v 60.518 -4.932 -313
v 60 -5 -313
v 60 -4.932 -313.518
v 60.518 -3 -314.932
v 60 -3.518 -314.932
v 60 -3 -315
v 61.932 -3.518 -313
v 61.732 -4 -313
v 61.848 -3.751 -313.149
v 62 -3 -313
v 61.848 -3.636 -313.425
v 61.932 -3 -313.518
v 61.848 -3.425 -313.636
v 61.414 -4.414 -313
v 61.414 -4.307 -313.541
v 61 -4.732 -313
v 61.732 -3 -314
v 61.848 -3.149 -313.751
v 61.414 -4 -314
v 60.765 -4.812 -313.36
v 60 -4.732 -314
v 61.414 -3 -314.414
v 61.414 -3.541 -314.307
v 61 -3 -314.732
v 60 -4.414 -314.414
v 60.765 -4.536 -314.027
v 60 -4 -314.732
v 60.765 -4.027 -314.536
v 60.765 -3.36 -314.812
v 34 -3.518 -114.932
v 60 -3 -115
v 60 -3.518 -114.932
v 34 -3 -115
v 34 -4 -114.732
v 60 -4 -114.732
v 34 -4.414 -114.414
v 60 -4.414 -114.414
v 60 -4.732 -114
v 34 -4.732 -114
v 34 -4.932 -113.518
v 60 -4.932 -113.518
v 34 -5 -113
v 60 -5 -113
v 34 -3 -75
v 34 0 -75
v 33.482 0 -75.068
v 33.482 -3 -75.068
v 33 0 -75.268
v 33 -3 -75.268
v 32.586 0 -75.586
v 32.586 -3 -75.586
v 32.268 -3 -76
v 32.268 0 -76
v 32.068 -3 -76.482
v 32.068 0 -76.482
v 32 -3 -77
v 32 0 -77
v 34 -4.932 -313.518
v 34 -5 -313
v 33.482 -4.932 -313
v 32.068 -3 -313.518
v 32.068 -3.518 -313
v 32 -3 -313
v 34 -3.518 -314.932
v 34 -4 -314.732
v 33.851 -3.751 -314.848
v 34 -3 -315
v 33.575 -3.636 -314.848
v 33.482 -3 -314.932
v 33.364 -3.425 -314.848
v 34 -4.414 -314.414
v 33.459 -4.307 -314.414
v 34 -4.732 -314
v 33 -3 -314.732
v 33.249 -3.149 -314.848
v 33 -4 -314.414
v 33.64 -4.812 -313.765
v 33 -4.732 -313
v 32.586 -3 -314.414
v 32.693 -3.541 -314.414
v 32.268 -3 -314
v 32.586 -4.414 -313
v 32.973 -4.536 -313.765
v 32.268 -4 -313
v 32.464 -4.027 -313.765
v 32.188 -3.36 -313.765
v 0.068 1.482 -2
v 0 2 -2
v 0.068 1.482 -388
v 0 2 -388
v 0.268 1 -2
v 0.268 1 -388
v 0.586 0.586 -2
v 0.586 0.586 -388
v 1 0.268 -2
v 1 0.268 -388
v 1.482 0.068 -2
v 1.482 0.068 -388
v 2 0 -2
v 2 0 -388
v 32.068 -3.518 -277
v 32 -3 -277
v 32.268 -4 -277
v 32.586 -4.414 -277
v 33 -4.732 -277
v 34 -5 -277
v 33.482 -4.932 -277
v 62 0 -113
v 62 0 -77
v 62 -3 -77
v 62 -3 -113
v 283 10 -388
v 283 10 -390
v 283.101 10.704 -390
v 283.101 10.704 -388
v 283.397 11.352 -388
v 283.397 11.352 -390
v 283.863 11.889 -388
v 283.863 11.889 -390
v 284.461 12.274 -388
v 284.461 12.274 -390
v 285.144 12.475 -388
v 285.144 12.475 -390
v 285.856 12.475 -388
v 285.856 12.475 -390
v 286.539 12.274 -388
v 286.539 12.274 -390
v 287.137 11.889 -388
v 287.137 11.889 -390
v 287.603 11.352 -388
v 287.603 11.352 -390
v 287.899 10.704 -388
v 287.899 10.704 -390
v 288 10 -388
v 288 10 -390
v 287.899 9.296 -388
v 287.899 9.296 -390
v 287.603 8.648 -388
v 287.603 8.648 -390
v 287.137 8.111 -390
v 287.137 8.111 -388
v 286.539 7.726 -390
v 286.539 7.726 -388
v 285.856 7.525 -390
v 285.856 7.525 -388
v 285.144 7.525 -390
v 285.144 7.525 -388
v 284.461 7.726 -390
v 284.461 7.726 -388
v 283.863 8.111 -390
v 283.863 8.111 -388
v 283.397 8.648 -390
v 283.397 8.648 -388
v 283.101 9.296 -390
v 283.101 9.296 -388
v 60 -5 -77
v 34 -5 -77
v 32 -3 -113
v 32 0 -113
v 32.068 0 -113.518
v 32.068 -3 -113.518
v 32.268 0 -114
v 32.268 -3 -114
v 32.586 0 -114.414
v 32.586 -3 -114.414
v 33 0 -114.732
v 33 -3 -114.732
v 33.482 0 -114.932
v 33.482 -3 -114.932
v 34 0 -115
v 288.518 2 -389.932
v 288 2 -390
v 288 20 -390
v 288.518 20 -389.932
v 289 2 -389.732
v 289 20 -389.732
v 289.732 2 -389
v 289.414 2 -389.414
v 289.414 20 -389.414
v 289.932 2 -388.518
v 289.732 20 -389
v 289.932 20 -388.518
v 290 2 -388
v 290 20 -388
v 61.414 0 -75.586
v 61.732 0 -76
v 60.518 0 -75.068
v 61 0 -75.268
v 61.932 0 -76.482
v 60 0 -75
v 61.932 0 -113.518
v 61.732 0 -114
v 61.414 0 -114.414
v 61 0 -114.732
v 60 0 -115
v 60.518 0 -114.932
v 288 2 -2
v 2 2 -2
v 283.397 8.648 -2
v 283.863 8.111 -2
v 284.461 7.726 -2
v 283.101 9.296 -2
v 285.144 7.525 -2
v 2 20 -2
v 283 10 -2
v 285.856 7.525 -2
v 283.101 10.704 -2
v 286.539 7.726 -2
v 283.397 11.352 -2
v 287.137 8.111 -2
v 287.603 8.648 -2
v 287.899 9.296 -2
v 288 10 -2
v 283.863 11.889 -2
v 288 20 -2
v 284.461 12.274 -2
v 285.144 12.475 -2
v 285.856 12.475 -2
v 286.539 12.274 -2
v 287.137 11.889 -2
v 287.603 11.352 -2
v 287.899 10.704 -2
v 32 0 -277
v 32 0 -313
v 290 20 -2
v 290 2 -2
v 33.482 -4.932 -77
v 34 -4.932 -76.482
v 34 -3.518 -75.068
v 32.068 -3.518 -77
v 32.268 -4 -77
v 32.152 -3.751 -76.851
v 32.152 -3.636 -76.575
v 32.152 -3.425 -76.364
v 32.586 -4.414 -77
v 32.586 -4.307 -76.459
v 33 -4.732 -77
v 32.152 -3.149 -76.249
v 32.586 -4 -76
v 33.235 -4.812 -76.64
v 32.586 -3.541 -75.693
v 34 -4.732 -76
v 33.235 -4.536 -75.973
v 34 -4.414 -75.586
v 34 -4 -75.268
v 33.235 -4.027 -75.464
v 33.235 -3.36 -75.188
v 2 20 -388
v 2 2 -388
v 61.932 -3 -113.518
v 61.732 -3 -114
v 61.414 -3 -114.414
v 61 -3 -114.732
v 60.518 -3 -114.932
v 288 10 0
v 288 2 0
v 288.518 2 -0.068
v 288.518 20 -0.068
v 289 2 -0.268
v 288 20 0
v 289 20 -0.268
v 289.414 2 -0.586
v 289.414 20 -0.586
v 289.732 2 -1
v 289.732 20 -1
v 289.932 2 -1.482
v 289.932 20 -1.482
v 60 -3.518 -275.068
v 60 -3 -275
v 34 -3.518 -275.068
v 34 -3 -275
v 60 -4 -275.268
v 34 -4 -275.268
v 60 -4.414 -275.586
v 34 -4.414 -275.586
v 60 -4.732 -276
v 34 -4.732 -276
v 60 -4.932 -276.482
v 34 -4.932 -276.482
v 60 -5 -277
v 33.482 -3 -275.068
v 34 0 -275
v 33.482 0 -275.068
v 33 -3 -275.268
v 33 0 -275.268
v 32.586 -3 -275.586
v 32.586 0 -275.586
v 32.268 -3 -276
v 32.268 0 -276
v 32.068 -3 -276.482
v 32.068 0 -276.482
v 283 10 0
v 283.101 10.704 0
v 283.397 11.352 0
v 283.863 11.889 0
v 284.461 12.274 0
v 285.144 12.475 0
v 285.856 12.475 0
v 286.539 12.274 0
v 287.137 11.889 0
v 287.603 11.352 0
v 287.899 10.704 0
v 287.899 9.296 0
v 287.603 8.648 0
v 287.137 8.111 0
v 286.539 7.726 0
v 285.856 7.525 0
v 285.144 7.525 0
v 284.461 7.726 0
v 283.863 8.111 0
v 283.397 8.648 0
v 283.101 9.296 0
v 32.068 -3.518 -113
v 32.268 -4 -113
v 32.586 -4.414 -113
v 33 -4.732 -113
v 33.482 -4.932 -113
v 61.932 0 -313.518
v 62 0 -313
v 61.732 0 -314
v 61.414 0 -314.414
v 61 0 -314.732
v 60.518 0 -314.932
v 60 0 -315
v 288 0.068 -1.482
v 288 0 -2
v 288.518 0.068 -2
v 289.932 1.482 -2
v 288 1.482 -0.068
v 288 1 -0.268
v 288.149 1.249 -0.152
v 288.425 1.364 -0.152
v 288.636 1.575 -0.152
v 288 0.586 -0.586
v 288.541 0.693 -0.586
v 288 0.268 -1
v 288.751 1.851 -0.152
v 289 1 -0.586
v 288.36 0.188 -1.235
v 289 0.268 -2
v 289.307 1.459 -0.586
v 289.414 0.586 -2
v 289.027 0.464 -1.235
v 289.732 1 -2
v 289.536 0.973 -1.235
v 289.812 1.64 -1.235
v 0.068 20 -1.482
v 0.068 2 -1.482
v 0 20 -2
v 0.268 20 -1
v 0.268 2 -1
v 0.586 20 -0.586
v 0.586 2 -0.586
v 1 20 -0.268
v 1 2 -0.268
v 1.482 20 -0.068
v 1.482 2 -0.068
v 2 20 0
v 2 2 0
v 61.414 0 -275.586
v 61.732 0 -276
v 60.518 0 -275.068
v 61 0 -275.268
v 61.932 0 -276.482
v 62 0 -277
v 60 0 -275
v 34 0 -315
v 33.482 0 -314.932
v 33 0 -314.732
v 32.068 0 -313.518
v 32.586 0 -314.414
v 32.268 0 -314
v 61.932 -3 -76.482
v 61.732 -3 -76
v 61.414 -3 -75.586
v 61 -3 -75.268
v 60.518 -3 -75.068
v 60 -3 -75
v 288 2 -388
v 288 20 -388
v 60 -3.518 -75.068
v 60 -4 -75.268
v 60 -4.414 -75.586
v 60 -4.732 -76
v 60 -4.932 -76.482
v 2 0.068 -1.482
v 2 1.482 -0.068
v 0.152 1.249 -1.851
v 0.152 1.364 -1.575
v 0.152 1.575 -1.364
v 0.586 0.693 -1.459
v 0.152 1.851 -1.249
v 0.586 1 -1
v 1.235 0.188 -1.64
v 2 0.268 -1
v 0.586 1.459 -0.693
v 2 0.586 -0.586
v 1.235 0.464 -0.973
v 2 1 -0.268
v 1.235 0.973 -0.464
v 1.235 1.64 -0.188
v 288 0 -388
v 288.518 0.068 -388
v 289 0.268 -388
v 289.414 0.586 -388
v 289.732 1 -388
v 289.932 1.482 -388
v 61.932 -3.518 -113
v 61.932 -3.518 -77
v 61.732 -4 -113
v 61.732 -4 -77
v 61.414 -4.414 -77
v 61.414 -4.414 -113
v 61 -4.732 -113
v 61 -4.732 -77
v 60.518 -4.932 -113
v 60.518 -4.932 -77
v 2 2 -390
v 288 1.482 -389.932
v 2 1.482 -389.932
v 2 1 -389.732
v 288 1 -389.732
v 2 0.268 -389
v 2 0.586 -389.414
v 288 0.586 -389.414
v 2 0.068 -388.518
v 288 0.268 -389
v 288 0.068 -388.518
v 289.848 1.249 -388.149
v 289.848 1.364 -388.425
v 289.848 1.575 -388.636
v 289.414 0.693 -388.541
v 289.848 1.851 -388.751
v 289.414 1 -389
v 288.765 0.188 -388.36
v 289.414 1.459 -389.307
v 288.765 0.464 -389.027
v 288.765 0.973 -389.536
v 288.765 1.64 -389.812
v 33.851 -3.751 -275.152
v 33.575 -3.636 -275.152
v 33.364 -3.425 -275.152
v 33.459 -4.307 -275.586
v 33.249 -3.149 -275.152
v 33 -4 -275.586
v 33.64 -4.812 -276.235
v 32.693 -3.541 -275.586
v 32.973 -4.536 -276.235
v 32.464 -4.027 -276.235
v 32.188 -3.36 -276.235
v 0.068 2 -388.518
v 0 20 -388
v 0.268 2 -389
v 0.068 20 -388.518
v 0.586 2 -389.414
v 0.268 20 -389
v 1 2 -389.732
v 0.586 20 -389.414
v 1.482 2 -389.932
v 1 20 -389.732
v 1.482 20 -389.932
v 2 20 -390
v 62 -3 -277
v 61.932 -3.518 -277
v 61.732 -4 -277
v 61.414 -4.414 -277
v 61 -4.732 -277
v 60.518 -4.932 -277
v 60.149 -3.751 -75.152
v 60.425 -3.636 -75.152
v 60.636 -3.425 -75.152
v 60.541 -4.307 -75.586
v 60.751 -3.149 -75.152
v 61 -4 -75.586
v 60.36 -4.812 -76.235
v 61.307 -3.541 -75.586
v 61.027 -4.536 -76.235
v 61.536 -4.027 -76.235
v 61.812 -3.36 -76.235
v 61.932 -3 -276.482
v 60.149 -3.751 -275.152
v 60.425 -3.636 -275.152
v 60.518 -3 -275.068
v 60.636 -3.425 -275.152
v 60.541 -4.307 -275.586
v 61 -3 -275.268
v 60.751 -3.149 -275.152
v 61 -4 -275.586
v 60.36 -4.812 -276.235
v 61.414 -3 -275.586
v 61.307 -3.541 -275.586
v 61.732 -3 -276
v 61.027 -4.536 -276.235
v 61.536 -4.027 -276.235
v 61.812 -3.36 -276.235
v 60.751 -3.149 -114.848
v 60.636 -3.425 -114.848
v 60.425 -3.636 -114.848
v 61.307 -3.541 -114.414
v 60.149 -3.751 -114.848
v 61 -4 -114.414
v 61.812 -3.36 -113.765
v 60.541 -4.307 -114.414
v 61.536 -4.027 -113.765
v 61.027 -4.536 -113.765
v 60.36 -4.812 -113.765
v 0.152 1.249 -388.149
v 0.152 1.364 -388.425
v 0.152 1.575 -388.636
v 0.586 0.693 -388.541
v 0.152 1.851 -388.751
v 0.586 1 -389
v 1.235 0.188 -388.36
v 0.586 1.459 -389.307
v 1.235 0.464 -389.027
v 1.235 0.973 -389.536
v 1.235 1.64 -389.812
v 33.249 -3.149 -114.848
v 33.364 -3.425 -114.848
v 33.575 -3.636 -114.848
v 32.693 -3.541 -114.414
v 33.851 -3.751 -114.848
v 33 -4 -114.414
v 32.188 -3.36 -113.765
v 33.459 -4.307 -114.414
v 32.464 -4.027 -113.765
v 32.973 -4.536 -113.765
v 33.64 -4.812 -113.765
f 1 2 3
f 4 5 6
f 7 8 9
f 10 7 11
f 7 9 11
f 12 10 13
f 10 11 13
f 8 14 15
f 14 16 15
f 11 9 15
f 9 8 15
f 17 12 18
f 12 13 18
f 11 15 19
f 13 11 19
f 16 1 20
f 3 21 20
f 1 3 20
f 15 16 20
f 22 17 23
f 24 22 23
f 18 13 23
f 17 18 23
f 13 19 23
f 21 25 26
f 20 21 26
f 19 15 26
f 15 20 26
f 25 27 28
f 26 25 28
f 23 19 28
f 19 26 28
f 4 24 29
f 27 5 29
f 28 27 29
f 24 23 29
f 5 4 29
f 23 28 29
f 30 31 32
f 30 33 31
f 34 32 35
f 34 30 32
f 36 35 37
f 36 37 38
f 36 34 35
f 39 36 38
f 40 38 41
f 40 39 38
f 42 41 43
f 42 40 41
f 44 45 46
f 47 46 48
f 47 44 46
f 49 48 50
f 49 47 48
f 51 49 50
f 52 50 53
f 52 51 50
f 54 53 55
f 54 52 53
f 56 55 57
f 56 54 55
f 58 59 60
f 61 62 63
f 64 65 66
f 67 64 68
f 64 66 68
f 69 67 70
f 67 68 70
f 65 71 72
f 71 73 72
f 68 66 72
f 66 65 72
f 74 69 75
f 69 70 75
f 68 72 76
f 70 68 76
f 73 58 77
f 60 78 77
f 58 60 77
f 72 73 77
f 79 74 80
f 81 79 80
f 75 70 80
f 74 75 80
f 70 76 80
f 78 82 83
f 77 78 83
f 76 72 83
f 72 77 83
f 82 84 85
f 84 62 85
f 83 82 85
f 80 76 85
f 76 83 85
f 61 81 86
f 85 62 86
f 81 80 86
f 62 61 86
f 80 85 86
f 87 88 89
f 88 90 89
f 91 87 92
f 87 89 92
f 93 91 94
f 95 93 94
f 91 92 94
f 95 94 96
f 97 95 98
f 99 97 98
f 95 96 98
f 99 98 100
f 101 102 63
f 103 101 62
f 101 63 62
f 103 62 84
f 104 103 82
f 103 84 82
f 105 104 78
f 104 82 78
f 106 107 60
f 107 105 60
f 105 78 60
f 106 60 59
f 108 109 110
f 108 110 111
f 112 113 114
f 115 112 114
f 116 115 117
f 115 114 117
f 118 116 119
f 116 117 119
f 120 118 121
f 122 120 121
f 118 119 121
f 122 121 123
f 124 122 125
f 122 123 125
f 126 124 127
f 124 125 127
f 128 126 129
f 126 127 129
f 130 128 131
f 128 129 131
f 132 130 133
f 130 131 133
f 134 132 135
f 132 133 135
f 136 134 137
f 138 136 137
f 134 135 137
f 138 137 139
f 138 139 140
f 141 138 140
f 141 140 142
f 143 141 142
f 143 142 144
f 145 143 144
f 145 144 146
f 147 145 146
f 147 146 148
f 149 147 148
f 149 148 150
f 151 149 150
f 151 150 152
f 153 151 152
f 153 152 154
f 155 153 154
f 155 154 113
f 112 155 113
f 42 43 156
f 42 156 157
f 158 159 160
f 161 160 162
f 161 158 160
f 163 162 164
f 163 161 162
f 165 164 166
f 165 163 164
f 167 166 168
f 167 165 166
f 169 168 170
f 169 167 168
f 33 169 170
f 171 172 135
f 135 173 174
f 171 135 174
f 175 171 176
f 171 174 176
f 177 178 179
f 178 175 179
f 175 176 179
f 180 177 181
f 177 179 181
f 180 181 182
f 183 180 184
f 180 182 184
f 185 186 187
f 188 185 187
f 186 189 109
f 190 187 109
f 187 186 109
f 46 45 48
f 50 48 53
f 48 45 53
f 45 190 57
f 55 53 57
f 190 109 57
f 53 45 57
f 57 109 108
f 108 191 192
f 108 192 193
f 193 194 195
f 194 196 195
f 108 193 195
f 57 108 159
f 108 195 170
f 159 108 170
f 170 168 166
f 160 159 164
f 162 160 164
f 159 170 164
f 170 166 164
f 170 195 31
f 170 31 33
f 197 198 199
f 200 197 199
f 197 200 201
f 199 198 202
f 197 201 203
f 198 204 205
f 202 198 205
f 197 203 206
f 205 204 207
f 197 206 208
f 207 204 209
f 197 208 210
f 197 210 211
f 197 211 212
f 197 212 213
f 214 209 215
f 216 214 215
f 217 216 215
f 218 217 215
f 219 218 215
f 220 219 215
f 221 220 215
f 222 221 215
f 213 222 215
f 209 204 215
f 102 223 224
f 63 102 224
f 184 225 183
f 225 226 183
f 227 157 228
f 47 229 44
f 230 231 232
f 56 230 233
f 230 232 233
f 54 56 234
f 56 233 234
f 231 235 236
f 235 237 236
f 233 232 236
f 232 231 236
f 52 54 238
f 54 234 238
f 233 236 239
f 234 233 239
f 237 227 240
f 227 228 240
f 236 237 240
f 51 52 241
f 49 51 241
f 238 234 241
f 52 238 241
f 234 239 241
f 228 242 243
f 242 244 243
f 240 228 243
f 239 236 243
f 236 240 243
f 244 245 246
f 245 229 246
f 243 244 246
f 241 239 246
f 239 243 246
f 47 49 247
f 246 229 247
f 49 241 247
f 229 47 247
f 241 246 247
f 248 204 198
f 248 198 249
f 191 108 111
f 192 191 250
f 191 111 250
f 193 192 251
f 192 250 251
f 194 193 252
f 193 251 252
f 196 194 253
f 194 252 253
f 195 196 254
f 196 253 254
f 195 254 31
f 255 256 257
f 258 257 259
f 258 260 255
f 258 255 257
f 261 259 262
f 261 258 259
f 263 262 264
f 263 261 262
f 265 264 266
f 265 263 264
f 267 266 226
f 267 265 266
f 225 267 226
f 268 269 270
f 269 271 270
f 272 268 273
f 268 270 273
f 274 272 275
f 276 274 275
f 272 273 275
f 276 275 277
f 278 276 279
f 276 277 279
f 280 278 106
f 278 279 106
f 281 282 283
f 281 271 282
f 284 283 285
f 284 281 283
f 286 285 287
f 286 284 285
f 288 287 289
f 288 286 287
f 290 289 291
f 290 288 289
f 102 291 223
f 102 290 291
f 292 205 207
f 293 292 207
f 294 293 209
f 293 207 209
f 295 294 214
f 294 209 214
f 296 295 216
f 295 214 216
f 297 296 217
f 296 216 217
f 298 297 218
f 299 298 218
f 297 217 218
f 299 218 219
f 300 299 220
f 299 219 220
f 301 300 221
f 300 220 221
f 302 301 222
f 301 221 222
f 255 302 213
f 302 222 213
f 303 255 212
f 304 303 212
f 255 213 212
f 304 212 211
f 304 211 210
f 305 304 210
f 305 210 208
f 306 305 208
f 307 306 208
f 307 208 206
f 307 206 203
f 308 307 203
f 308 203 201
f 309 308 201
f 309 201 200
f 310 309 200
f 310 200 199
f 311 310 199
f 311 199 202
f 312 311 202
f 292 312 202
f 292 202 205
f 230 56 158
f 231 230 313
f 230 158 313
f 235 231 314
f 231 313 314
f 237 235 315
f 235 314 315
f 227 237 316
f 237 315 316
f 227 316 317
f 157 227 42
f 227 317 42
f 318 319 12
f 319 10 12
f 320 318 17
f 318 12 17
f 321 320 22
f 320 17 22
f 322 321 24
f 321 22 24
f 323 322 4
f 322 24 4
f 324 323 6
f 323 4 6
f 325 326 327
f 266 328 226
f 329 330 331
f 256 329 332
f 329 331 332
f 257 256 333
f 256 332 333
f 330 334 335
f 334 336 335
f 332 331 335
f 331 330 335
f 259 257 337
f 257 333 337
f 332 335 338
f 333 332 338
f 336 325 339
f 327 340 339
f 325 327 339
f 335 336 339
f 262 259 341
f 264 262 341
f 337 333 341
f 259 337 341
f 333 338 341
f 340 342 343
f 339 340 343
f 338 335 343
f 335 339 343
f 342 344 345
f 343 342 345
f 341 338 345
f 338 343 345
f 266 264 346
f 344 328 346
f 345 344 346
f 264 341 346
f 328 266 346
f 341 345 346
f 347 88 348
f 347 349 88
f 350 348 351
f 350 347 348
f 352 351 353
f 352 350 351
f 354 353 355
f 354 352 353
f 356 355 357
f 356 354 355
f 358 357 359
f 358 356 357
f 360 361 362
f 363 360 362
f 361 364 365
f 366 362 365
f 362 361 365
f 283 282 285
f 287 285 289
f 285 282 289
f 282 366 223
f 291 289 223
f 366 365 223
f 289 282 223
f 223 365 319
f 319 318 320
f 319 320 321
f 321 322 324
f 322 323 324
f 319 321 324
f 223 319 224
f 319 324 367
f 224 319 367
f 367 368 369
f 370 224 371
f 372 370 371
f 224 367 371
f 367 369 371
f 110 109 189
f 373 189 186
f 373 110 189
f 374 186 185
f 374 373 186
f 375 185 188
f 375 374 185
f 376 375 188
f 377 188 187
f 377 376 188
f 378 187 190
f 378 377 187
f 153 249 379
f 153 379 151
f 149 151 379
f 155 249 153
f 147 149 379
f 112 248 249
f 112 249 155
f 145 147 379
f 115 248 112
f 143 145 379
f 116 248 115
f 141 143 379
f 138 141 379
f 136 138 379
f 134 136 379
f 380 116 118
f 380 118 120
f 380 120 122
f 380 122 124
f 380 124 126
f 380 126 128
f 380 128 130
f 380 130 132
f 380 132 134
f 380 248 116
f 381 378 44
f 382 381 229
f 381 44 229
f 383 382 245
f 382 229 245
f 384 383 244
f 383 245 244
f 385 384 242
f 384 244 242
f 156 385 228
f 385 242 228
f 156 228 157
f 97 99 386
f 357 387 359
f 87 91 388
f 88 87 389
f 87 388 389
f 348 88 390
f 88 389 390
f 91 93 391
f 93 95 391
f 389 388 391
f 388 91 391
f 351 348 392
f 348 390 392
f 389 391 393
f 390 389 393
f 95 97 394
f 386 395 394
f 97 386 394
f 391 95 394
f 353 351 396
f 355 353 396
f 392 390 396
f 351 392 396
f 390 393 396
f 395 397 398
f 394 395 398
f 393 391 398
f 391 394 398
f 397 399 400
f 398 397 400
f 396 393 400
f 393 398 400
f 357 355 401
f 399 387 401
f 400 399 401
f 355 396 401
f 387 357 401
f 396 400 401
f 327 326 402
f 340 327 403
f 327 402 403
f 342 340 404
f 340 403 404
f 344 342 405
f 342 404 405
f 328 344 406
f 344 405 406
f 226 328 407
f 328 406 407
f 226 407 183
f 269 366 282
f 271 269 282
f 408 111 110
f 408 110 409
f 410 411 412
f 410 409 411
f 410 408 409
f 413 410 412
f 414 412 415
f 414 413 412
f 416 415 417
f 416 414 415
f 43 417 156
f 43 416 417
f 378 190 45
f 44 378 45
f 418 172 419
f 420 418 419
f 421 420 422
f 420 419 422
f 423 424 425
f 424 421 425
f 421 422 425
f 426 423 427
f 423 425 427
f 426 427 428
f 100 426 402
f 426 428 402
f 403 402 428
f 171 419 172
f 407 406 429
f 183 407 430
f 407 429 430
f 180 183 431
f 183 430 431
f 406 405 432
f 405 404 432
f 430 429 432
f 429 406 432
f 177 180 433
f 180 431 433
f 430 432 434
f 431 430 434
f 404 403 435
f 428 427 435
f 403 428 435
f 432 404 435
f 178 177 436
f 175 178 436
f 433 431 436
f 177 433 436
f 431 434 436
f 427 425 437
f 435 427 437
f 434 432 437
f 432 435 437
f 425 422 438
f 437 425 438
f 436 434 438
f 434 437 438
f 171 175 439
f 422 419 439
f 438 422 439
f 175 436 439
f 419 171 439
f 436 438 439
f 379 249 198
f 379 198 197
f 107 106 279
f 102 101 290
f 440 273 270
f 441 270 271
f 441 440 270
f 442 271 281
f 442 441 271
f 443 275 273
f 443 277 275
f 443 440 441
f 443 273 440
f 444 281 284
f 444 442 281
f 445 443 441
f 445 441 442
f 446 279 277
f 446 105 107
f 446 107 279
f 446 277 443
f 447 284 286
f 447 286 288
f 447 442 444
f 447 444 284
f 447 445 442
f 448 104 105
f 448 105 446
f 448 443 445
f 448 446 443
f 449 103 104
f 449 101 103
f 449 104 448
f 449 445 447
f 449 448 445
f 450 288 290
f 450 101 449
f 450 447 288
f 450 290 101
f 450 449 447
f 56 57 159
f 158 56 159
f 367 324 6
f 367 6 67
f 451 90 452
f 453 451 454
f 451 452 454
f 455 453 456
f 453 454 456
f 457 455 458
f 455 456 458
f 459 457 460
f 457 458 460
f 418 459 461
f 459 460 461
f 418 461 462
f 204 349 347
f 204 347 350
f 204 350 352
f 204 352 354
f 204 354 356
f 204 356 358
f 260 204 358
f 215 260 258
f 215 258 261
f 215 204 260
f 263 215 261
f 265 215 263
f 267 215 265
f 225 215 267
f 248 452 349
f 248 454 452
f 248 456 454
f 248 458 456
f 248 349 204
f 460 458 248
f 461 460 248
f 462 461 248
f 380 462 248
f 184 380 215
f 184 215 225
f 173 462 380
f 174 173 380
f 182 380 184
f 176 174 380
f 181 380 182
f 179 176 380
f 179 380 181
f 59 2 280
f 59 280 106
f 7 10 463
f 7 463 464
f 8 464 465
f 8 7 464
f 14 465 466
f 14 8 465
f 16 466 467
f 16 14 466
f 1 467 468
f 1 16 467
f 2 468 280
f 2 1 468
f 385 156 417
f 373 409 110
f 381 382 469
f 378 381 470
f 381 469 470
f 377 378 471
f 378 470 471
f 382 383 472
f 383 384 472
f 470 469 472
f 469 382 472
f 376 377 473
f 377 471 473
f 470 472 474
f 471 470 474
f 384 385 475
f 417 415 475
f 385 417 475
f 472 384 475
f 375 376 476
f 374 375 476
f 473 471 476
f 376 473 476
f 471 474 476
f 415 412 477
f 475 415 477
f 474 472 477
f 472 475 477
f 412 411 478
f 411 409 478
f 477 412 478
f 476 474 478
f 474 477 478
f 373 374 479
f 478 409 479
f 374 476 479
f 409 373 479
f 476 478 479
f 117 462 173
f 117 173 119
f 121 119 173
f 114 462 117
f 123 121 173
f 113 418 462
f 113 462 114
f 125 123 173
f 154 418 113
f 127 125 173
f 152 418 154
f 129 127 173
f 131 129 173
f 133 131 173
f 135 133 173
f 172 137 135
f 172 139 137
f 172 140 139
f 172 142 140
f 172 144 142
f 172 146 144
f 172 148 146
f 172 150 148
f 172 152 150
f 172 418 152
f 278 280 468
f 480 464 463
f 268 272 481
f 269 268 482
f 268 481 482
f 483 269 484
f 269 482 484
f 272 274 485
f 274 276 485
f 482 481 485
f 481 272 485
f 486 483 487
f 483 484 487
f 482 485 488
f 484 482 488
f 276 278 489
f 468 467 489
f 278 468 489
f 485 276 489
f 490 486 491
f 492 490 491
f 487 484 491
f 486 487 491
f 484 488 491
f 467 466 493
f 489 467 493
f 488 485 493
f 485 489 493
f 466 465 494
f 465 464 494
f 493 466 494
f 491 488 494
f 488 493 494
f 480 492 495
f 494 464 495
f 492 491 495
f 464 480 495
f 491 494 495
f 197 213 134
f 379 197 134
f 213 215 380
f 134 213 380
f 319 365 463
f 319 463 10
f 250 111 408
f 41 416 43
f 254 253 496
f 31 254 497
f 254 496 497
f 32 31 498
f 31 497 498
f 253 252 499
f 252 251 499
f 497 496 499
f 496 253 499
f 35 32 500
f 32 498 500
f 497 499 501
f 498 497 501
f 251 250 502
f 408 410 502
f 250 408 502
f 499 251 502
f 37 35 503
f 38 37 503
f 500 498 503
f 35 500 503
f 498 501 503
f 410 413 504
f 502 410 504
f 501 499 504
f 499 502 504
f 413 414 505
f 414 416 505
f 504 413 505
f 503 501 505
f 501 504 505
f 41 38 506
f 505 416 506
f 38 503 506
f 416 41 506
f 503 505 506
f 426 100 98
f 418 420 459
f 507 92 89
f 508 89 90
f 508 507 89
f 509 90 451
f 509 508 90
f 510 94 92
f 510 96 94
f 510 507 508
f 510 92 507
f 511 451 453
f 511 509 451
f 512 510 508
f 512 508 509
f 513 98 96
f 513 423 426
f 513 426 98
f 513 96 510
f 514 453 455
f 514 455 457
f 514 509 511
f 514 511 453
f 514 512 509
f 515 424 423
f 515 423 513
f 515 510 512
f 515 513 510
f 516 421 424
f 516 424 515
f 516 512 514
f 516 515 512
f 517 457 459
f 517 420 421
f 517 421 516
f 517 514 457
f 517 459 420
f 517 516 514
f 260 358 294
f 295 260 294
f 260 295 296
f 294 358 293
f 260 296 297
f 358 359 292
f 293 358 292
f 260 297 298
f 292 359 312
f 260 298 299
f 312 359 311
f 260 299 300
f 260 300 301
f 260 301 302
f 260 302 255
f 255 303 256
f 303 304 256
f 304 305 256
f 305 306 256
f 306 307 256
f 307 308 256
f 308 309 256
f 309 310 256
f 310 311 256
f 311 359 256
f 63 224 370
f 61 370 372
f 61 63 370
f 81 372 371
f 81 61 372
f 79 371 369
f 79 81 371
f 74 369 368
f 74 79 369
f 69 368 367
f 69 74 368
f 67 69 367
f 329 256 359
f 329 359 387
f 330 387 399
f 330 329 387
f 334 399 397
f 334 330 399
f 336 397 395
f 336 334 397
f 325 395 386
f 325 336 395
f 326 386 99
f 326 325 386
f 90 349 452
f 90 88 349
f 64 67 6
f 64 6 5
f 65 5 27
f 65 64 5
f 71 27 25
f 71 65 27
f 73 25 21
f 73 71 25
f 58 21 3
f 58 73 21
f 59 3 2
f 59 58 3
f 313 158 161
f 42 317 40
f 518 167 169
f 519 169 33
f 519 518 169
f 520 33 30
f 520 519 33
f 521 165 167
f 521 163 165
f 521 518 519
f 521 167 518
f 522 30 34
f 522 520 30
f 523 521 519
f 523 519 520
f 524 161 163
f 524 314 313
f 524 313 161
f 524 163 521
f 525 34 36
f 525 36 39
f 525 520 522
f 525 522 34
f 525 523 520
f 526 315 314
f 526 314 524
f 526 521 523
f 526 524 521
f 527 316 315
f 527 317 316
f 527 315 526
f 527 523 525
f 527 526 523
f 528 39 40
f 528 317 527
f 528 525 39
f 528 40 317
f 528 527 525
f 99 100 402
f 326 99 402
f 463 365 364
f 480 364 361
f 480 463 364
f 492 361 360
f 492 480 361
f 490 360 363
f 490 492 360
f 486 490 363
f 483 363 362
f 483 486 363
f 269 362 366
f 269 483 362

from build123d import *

# Parameters (mm, degrees)
SKETCH1_W             = 290
SKETCH1_H             = 390
BOSS_EXTRUDE1_DEPTH   = 20
SKETCH2_W             = 286
SKETCH2_H             = 386
CUT_EXTRUDE1_DEPTH    = 18
FILLET1_R             = 2
SKETCH3_R             = 2.5
CUT_EXTRUDE2_DEPTH    = 391
SKETCH4_W             = 30
SKETCH4_H             = 40
BOSS_EXTRUDE2_DEPTH   = 5
BOSS_EXTRUDE2_2_DEPTH = 5
FILLET2_R             = 2
FILLET3_R             = 2


with BuildPart() as part:
    # Sketch1 → Boss-Extrude1 (new body)
    with BuildSketch(Plane(origin=(0, 0, 0), x_dir=(1, 0, 0), z_dir=(0, 1, 0))):
        with Locations((145, 195)):
            Rectangle(SKETCH1_W, SKETCH1_H)
    extrude(amount=BOSS_EXTRUDE1_DEPTH)

    # Sketch2 → Cut-Extrude1 (cut)
    with BuildSketch(Plane(origin=(0, 20, 0), x_dir=(1, 0, 0), z_dir=(0, 1, 0))):
        with Locations((145, 195)):
            Rectangle(SKETCH2_W, SKETCH2_H)
    extrude(amount=-CUT_EXTRUDE1_DEPTH, mode=Mode.SUBTRACT)

    # Fillet1
    fillet1_edges = [part.edges().sort_by_distance(p)[0] for p in [
        (145, 0, -390),
        (290, 0, -195),
        (145, 0, 0),
        (0, 0, -195),
        (0, 10, -390),
        (290, 10, -390),
        (290, 10, 0),
        (0, 10, 0),
    ]]
    fillet(fillet1_edges, radius=FILLET1_R)

    # Sketch3 → Cut-Extrude2 (cut, through all)
    with BuildSketch(Plane(origin=(0, 0, -390), x_dir=(-1, 0, 0), z_dir=(0, 0, -1))):
        with Locations((-285.5, 10)):
            Circle(SKETCH3_R)
    extrude(amount=-CUT_EXTRUDE2_DEPTH, mode=Mode.SUBTRACT)


with BuildPart() as body_2:
    # Sketch4 → Boss-Extrude2 (new body)
    with BuildSketch(Plane(origin=(0, 0, 0), x_dir=(-1, 0, 0), z_dir=(0, -1, 0))):
        with Locations((-47, 95)):
            Rectangle(SKETCH4_W, SKETCH4_H)
    extrude(amount=BOSS_EXTRUDE2_DEPTH)

    # Fillet2
    fillet2_edges = [body_2.edges().sort_by_distance(p)[0] for p in [
        (62, -5, -95),
        (47, -5, -75),
        (32, -5, -95),
        (32, -2.5, -75),
        (62, -2.5, -75),
        (62, -2.5, -115),
        (32, -2.5, -115),
        (47, -5, -115),
    ]]
    fillet(fillet2_edges, radius=FILLET2_R)


with BuildPart() as body_3:
    # Sketch4 → Boss-Extrude2 2 (new body)
    with BuildSketch(Plane(origin=(0, 0, 0), x_dir=(-1, 0, 0), z_dir=(0, -1, 0))):
        with Locations((-47, 295)):
            Rectangle(SKETCH4_W, SKETCH4_H)
    extrude(amount=BOSS_EXTRUDE2_2_DEPTH)

    # Fillet3
    fillet3_edges = [body_3.edges().sort_by_distance(p)[0] for p in [
        (32, -5, -295),
        (47, -5, -315),
        (62, -5, -295),
        (47, -5, -275),
        (32, -2.5, -275),
        (62, -2.5, -275),
        (62, -2.5, -315),
        (32, -2.5, -315),
    ]]
    fillet(fillet3_edges, radius=FILLET3_R)


solid = Compound([part.part, body_2.part, body_3.part])
